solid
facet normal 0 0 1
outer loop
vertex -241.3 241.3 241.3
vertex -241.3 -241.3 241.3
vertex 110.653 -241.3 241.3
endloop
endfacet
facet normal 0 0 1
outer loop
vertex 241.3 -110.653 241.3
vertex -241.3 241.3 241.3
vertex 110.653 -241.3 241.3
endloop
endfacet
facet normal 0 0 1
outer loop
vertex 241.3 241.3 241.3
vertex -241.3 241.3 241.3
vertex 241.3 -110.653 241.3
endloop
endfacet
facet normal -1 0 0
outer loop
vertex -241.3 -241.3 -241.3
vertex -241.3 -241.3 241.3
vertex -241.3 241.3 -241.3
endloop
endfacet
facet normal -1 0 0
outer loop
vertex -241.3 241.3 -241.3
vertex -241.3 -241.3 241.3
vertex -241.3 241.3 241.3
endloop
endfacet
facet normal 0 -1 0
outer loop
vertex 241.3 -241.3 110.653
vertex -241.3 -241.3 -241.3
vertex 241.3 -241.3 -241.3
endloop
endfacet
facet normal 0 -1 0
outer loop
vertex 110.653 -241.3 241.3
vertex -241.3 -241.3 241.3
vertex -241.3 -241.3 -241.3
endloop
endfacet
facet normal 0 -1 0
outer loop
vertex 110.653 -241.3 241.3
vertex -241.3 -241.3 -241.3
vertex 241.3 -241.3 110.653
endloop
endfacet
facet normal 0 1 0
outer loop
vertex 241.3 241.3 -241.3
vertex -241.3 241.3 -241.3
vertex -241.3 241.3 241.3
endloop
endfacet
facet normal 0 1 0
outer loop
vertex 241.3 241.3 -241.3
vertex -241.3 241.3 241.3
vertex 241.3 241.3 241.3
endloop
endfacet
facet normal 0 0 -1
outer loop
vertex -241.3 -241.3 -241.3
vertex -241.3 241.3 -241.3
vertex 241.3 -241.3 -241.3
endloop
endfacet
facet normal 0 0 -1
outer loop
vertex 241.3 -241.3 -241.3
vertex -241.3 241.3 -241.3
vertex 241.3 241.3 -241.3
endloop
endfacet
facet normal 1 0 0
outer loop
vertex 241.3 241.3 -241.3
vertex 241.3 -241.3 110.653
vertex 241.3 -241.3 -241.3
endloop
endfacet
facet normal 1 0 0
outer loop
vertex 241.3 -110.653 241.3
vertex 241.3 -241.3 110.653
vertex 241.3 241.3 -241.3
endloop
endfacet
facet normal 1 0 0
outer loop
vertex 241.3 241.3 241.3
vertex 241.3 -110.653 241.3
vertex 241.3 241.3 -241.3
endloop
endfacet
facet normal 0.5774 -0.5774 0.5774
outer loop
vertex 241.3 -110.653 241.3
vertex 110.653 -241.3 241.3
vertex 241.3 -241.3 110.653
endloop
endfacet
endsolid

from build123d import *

# Parameters (mm, degrees)
F0_W     = 482.6
F0_H     = 482.6
F1_DEPTH = 241.3
F4_START = 203.2
F4_DEPTH = 76.2


with BuildPart() as f1:
    # F0 (on Top) → F1 (new body, symmetric)
    with BuildSketch(Plane.XY):
        Rectangle(F0_W, F0_H)
    extrude(amount=F1_DEPTH, both=True)

    # F3 (on 3pt) → F4 (cut)
    with BuildSketch(Plane(origin=(80.4333333333, -80.4333333333, 80.4333333333), x_dir=(0.4082482905, 0.8164965809, 0.4082482905), z_dir=(0.5773502692, -0.5773502692, 0.5773502692)).offset(F4_START)):
        Polygon((394.0412499557, 0), (-197.0206249779, 341.2497326006), (-197.0206249779, -341.2497326006), align=None)
    extrude(amount=F4_DEPTH, mode=Mode.SUBTRACT)


solid = f1.part
